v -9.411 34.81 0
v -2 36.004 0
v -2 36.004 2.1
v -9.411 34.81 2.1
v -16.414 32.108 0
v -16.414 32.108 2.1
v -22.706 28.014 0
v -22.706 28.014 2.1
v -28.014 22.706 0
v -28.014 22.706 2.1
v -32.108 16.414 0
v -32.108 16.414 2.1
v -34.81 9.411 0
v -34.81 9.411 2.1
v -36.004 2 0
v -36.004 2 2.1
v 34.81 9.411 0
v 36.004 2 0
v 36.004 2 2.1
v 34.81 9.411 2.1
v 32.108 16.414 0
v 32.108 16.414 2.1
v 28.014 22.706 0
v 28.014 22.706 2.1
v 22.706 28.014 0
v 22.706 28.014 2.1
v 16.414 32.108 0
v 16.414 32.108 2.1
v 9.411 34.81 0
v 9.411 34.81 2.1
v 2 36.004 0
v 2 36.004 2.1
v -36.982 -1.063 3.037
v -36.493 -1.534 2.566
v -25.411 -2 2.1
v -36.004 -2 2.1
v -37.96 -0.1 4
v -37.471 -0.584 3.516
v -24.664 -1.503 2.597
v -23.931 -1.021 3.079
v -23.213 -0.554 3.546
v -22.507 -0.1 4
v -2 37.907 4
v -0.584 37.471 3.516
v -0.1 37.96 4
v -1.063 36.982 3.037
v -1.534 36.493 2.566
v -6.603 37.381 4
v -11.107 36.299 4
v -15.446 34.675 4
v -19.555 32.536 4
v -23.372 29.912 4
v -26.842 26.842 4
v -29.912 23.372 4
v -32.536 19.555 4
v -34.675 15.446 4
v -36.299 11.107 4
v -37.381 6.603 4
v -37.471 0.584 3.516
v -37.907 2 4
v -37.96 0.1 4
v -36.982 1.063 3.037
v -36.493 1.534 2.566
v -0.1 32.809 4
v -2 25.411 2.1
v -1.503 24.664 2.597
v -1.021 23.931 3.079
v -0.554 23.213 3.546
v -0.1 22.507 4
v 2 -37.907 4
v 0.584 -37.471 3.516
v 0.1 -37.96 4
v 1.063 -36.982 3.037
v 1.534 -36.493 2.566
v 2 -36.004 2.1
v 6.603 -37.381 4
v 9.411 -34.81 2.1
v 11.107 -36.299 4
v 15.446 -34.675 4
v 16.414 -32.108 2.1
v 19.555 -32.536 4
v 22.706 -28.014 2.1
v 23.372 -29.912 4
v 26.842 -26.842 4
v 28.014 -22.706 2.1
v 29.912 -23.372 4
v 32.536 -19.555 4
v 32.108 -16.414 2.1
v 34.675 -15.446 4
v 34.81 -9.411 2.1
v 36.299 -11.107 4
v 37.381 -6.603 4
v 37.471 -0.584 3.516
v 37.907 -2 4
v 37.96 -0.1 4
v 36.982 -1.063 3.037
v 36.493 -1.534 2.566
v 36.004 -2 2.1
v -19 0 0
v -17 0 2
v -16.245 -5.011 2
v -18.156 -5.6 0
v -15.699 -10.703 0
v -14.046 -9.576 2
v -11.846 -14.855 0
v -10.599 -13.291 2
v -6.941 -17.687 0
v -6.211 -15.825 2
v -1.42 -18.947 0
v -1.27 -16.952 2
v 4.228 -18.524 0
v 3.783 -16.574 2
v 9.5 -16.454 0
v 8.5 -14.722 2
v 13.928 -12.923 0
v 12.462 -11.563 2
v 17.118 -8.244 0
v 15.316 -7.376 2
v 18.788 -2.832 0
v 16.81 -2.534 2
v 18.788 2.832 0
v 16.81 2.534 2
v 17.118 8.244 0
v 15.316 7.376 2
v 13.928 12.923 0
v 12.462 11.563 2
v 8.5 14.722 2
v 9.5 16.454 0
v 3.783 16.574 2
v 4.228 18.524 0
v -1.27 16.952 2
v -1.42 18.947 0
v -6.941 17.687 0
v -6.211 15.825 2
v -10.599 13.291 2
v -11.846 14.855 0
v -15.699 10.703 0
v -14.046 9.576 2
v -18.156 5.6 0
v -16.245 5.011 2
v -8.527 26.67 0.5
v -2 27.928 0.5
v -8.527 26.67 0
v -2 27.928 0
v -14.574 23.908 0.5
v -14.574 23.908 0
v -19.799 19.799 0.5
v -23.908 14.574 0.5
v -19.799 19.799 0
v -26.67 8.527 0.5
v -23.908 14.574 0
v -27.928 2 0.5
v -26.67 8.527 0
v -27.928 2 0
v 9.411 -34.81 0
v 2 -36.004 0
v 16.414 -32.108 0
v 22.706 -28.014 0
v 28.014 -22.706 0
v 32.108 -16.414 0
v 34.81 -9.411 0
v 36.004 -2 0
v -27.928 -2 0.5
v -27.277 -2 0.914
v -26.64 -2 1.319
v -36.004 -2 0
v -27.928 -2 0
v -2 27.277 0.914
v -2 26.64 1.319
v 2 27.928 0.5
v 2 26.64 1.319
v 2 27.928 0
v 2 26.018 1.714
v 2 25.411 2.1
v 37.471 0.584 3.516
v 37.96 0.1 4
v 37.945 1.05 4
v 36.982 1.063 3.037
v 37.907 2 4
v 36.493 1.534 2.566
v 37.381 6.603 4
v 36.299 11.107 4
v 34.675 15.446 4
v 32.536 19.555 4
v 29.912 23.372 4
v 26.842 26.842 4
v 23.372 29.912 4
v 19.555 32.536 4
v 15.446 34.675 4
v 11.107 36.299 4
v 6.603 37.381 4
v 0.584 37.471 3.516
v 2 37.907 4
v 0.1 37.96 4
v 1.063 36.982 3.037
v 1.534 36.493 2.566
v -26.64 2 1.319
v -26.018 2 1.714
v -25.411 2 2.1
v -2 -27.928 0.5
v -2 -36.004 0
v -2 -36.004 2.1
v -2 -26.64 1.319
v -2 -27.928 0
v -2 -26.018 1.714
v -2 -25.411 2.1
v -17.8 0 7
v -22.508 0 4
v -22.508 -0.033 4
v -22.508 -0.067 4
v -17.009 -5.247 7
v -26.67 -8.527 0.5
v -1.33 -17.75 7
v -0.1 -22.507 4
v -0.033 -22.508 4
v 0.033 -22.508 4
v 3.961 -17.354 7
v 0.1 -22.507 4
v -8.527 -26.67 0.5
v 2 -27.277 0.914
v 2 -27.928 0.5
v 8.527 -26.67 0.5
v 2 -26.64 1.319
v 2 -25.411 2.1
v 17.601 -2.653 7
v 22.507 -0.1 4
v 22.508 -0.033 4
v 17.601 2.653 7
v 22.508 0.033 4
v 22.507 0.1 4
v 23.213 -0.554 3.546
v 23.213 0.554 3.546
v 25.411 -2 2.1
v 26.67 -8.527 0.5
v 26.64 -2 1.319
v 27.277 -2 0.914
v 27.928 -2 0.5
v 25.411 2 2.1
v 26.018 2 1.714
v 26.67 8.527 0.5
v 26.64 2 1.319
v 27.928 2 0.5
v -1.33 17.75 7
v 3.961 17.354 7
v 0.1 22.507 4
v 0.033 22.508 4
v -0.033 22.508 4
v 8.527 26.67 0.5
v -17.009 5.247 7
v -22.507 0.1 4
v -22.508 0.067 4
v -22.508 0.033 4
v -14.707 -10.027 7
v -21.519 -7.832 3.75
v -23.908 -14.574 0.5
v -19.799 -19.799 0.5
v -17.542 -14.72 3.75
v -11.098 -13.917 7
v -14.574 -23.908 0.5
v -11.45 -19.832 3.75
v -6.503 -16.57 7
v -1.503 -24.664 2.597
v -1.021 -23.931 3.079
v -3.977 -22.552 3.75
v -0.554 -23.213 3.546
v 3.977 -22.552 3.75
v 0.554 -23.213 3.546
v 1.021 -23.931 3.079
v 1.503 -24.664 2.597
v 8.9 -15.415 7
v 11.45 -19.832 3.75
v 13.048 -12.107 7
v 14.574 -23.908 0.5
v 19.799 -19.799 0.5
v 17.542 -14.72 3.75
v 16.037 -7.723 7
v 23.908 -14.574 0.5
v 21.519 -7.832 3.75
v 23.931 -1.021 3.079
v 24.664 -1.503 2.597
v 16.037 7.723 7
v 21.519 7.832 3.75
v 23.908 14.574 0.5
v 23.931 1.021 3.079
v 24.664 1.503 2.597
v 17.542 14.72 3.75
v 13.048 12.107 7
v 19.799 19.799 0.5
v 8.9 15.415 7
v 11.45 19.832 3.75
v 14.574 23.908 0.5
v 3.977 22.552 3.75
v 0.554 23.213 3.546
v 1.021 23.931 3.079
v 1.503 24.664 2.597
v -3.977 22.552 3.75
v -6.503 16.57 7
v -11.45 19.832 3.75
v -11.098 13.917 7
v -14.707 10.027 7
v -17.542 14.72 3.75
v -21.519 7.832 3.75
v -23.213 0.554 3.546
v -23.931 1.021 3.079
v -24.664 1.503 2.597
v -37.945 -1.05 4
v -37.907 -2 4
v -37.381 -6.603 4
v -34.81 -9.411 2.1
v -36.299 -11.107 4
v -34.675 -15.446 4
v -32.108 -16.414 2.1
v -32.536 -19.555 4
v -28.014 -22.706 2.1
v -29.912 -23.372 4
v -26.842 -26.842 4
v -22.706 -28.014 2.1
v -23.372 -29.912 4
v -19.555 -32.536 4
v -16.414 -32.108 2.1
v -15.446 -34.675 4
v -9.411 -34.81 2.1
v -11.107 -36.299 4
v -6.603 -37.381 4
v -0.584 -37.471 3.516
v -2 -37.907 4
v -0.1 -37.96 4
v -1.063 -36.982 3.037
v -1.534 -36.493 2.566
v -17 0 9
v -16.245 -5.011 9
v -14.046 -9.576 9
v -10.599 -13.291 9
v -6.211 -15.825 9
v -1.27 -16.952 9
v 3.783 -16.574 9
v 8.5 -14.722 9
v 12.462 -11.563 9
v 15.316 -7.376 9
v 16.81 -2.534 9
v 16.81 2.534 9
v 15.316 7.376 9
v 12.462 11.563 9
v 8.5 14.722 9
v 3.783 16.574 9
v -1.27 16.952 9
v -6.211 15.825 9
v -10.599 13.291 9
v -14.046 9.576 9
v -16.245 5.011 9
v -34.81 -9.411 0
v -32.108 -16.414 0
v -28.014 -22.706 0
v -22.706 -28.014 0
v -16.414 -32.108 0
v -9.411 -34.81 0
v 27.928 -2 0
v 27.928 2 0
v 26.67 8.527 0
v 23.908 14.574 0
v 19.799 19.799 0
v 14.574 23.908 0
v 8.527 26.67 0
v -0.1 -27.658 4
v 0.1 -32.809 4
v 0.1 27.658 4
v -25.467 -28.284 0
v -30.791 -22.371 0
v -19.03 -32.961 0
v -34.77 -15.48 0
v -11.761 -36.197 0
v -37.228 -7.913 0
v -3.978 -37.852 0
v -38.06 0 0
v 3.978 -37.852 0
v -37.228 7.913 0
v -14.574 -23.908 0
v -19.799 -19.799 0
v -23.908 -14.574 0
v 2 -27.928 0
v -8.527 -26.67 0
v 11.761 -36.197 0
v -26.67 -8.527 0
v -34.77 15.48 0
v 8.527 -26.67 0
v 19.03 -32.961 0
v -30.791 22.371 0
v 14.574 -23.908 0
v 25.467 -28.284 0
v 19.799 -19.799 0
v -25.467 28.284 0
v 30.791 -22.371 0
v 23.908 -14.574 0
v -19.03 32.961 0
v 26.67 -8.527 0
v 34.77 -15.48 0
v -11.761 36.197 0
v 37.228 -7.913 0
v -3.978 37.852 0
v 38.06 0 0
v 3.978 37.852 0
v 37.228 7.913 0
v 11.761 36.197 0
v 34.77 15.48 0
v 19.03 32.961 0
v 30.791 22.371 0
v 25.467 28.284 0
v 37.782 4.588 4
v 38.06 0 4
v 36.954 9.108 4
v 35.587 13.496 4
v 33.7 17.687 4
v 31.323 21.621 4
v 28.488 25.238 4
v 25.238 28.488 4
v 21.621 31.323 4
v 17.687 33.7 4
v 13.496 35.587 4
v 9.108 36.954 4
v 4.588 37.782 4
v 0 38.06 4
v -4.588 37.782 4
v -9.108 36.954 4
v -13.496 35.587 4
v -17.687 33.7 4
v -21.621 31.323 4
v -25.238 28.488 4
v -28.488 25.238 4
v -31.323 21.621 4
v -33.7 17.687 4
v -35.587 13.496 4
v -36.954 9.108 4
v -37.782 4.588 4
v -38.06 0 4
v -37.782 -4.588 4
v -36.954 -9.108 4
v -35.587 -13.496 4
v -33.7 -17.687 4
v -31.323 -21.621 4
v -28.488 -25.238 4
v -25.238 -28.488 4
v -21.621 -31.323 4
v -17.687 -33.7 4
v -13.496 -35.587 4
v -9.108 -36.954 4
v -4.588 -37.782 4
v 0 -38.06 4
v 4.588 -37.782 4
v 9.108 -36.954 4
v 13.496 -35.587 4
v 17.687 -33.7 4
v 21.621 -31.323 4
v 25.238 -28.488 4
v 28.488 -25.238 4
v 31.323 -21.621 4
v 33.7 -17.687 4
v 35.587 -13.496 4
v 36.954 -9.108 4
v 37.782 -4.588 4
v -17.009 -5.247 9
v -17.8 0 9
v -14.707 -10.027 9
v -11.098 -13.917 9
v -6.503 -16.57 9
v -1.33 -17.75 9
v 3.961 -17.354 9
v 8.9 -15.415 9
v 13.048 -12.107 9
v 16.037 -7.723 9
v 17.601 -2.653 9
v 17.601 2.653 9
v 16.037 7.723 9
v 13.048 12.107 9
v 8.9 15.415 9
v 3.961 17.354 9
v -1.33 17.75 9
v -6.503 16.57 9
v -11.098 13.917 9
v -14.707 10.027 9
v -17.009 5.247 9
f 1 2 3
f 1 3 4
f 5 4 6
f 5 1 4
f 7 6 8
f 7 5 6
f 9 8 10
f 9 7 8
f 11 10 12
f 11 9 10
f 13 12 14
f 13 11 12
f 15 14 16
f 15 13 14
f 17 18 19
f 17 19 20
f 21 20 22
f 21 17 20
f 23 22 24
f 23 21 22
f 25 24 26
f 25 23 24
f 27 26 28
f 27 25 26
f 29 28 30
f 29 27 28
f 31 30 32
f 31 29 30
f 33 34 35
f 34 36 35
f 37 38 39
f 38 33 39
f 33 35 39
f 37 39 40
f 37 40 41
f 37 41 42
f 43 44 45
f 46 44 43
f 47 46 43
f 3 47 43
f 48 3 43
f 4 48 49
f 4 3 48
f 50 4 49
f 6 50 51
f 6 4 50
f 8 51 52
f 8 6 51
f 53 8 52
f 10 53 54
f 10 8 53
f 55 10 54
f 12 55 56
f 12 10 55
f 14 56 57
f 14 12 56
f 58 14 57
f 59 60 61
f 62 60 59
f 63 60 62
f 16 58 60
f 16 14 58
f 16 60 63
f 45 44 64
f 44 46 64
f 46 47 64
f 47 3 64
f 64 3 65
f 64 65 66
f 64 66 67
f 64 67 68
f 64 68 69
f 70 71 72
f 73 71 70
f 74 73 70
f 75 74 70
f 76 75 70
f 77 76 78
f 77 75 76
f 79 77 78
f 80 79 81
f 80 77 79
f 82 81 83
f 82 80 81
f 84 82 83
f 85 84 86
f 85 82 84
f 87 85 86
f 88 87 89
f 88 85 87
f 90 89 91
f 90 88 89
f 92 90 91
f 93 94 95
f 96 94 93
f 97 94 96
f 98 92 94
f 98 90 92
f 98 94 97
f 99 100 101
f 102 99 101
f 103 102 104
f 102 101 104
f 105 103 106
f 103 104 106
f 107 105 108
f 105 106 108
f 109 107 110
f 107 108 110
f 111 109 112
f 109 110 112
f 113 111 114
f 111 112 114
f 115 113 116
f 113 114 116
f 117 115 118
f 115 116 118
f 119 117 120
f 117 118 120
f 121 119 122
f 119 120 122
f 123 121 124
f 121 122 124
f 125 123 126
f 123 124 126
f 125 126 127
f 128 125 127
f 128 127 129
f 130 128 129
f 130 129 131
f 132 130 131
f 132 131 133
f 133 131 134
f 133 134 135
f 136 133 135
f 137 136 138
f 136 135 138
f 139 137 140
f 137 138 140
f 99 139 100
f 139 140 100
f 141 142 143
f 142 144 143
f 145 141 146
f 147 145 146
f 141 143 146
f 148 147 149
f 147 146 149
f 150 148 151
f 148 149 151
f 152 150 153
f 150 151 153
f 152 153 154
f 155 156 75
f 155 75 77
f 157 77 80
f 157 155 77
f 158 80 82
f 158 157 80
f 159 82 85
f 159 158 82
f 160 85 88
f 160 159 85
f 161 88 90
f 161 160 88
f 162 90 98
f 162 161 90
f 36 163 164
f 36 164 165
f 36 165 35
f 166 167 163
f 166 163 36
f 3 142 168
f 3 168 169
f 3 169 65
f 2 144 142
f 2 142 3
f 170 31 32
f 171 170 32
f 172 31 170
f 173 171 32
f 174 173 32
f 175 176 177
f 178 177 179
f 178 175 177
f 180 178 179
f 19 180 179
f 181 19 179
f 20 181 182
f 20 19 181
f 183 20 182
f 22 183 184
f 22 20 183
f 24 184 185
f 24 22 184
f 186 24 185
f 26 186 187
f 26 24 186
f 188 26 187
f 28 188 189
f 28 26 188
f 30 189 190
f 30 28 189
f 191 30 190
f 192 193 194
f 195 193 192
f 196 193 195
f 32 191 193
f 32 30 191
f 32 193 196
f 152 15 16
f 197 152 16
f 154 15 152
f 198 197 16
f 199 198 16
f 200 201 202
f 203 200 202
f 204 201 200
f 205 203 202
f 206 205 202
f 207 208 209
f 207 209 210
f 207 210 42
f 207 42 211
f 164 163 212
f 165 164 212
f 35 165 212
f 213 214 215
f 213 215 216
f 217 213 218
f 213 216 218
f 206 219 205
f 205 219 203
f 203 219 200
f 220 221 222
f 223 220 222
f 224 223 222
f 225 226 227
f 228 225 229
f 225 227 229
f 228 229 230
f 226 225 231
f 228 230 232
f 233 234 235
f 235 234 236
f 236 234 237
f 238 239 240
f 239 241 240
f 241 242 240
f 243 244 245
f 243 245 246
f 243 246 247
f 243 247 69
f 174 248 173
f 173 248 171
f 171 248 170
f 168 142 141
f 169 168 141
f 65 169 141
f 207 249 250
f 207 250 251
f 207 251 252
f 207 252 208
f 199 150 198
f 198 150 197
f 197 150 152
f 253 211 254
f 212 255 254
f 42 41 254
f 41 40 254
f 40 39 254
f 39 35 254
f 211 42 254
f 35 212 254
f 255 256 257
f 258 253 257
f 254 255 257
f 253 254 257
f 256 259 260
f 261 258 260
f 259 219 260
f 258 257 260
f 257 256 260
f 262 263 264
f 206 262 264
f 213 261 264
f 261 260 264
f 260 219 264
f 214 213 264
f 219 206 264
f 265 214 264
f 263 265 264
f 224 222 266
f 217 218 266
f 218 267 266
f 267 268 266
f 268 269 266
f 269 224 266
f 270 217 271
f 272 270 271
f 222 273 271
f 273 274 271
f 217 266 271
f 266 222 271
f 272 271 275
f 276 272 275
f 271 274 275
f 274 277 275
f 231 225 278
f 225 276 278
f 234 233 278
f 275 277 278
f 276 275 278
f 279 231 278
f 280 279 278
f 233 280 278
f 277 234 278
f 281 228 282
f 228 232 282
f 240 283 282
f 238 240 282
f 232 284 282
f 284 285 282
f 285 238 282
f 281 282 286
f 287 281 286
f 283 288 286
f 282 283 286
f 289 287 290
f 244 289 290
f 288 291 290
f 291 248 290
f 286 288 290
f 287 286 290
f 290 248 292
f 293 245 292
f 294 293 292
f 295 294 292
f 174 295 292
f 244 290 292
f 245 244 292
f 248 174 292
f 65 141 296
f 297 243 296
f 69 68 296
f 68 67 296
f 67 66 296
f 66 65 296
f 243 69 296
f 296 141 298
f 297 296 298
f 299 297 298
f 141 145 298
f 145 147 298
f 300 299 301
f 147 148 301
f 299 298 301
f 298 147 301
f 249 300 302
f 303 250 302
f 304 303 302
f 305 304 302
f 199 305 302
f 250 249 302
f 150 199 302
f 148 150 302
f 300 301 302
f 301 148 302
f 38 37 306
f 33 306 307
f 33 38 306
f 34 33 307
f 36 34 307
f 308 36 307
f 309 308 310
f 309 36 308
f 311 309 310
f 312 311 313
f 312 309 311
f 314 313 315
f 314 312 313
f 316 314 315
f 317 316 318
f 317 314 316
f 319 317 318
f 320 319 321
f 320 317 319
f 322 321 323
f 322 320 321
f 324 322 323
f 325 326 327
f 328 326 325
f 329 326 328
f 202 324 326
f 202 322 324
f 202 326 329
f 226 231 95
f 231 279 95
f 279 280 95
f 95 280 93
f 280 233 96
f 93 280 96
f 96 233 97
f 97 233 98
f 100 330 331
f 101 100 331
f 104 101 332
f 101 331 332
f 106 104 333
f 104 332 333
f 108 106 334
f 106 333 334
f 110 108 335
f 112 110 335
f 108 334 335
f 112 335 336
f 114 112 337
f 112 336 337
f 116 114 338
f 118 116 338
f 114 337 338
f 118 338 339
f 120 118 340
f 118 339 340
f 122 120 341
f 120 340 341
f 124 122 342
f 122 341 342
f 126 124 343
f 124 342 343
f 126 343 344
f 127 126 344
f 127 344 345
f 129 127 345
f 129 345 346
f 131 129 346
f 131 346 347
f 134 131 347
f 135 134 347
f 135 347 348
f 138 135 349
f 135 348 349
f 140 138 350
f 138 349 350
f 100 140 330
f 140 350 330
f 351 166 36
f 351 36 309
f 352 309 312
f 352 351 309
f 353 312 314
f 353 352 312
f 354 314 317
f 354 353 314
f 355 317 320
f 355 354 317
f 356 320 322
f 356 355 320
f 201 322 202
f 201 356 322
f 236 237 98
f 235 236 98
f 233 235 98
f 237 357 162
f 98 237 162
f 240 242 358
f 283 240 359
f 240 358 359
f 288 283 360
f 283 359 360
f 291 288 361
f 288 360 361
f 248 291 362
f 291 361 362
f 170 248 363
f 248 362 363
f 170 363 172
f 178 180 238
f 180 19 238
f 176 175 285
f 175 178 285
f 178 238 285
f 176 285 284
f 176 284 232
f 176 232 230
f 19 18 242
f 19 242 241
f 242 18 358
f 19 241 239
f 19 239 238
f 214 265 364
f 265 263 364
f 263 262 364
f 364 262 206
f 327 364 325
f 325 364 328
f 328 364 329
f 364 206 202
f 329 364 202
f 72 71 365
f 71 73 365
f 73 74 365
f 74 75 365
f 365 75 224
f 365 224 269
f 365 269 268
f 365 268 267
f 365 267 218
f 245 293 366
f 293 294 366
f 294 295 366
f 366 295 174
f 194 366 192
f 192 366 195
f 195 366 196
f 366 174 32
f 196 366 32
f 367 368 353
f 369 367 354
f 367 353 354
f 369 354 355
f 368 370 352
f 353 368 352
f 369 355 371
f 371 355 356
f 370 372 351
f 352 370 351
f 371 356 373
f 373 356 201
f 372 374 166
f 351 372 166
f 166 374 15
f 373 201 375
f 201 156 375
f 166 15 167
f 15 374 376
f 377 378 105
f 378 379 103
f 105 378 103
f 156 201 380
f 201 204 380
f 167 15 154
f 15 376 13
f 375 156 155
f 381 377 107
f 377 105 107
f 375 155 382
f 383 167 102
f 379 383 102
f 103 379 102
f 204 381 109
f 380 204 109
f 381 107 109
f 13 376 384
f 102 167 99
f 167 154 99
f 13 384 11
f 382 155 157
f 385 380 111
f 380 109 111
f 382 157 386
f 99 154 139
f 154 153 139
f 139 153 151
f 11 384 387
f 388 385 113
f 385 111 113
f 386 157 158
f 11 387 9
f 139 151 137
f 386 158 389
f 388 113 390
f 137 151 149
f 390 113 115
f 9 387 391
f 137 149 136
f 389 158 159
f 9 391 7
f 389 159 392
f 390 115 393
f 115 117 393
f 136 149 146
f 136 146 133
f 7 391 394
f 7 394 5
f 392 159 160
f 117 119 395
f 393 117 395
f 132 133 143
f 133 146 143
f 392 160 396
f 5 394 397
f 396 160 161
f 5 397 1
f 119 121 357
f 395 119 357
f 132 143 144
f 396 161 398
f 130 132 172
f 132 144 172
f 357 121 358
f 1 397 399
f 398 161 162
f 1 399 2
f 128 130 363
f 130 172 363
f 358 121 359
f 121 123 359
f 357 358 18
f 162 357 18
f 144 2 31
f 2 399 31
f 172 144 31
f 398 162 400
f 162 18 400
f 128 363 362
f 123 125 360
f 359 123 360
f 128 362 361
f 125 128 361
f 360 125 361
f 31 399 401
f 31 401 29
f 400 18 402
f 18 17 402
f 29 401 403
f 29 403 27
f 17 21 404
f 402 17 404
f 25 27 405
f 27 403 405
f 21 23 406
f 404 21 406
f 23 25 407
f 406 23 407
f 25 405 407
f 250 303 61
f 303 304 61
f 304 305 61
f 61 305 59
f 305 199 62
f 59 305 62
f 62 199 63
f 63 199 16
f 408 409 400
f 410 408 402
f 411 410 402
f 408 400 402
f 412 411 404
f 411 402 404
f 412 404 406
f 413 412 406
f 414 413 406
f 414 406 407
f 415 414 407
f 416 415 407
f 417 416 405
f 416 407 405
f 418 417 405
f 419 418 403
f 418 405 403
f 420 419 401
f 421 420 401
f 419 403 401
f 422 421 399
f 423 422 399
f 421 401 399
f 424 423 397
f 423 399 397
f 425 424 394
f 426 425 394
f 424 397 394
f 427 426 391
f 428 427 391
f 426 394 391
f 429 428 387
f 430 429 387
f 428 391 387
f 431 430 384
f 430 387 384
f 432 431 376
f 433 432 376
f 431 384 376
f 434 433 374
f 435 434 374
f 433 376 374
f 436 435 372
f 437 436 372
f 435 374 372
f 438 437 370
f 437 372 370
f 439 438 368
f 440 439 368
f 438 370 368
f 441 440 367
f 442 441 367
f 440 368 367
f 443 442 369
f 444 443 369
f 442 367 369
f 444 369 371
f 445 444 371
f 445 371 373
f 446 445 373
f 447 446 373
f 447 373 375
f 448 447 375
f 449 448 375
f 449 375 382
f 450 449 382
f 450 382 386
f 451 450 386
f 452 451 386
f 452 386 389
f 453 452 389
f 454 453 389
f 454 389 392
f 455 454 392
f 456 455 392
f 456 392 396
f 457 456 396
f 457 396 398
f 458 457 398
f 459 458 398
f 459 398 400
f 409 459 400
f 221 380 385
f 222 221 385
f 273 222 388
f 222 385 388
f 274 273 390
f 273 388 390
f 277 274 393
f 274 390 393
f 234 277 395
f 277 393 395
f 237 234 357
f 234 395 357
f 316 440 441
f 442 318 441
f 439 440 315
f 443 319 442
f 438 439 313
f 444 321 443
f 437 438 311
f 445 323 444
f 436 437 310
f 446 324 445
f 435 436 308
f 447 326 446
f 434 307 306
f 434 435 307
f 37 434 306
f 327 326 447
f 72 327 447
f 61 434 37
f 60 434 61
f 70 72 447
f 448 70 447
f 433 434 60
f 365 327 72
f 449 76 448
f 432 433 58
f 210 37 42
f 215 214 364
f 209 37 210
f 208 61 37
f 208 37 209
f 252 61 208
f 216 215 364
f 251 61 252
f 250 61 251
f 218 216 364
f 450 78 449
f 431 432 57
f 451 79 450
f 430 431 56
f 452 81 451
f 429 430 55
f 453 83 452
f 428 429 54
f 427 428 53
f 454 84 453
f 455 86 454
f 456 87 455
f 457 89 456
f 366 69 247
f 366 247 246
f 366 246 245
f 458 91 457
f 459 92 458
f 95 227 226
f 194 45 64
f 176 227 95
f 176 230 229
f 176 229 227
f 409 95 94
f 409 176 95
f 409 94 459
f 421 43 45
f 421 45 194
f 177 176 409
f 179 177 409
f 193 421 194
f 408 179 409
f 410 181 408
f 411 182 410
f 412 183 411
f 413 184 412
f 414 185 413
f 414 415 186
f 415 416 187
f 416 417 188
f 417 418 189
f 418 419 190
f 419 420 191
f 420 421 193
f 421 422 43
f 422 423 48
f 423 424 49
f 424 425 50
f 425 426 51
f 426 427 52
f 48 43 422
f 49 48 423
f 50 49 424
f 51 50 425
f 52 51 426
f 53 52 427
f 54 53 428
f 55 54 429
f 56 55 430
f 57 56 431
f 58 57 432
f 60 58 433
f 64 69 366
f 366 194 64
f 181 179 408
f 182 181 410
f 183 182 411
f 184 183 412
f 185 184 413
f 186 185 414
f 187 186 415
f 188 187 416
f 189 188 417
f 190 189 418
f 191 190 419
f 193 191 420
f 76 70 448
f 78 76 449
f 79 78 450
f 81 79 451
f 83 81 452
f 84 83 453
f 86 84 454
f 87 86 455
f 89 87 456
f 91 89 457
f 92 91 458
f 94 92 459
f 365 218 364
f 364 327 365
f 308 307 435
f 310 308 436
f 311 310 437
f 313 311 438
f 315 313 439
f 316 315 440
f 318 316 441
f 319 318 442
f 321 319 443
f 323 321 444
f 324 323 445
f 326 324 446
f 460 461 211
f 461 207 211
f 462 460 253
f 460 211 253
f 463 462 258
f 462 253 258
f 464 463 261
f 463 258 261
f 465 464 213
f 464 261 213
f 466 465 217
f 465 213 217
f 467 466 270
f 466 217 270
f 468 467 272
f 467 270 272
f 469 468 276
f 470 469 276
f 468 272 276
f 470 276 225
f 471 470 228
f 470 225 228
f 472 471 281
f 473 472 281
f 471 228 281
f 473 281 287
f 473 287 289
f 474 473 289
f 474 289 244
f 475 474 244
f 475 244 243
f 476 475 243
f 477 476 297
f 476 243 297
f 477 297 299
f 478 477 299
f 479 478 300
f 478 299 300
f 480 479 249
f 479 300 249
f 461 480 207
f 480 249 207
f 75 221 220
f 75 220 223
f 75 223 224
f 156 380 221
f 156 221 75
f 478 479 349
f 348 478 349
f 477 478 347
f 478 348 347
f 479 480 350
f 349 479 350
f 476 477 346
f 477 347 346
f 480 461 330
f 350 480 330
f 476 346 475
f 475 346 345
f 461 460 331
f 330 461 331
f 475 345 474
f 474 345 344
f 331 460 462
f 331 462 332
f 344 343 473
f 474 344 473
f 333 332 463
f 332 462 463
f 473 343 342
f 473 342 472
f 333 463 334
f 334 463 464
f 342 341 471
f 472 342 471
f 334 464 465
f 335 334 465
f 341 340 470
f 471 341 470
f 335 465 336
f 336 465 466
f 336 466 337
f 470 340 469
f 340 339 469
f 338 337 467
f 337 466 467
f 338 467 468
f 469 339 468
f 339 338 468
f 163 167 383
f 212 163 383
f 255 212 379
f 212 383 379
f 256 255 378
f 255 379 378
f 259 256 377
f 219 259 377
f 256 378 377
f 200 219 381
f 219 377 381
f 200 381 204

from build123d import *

# Parameters (mm, degrees)
SKETCH001_R     = 38.06
PAD_DEPTH       = 4
CHAMFER_SIZE    = 1.9
CHAMFER001_SIZE = 1.9
CHAMFER002_SIZE = 2


with BuildPart() as part:
    # Sketch → Revolution (revolve)
    with BuildSketch(Plane.XZ):
        Polygon((-17, 0), (-17, 9), (-17.8, 9), (-17.8, 7), (-28, 0.5), (-28, 0), align=None)
    revolve(axis=Axis((0, 0, 0), (0, 0, 1)))

    # Sketch001 → Pad (new body)
    with BuildSketch(Plane.XY):
        Circle(SKETCH001_R)
        with BuildLine():
            ThreePointArc((-2, 36.004494), (-25.498271, 25.498271), (-36.004494, 2))
            Line((-36.004494, 2), (-19.1, 2))
            Line((-19.1, 2), (-19.1, -2))
            Line((-19.1, -2), (-36.004494, -2))
            ThreePointArc((-36.004494, -2), (-25.498271, -25.498271), (-2, -36.004494))
            Line((-2, -36.004494), (-2, -19.1))
            Line((-2, -19.1), (2, -19.1))
            Line((2, -19.1), (2, -36.004494))
            ThreePointArc((2, -36.004494), (25.498271, -25.498271), (36.004494, -2))
            Line((19.1, -2), (36.004494, -2))
            Line((19.1, 2), (19.1, -2))
            Line((36.004494, 2), (19.1, 2))
            ThreePointArc((36.004494, 2), (25.498271, 25.498271), (2, 36.004494))
            Line((2, 36.004494), (2, 19.1))
            Line((2, 19.1), (-2, 19.1))
            Line((-2, 19.1), (-2, 36.004494))
        make_face(mode=Mode.SUBTRACT)
    extrude(amount=PAD_DEPTH)

    # Chamfer
    chamfer_edges = [part.edges().sort_by_distance(p)[0] for p in [
        (-25.498271, -25.498271, 4),
        (-25.498271, 25.498271, 4),
        (25.498271, 25.498271, 4),
        (25.498271, -25.498271, 4),
    ]]
    chamfer(chamfer_edges, length=CHAMFER_SIZE)

    # Chamfer001
    chamfer001_edges = [part.edges().sort_by_distance(p)[0] for p in [
        (-36.955885, -2, 4),
        (-29.211576, -2, 4),
        (-36.955885, 2, 4),
        (-29.211576, 2, 4),
        (-2, -29.211576, 4),
        (-2, -36.955885, 4),
        (2, -36.955885, 4),
        (2, -29.211576, 4),
        (29.211576, -2, 4),
        (36.955885, -2, 4),
        (36.955885, 2, 4),
        (29.211576, 2, 4),
        (2, 29.211576, 4),
        (2, 36.955885, 4),
        (-2, 36.955885, 4),
        (-2, 29.211576, 4),
    ]]
    chamfer(chamfer001_edges, length=CHAMFER001_SIZE)

    # Chamfer002
    chamfer002_edges = [part.edges().sort_by_distance(p)[0] for p in [
        (17, 0, 0),
    ]]
    chamfer(chamfer002_edges, length=CHAMFER002_SIZE)


solid = part.part
